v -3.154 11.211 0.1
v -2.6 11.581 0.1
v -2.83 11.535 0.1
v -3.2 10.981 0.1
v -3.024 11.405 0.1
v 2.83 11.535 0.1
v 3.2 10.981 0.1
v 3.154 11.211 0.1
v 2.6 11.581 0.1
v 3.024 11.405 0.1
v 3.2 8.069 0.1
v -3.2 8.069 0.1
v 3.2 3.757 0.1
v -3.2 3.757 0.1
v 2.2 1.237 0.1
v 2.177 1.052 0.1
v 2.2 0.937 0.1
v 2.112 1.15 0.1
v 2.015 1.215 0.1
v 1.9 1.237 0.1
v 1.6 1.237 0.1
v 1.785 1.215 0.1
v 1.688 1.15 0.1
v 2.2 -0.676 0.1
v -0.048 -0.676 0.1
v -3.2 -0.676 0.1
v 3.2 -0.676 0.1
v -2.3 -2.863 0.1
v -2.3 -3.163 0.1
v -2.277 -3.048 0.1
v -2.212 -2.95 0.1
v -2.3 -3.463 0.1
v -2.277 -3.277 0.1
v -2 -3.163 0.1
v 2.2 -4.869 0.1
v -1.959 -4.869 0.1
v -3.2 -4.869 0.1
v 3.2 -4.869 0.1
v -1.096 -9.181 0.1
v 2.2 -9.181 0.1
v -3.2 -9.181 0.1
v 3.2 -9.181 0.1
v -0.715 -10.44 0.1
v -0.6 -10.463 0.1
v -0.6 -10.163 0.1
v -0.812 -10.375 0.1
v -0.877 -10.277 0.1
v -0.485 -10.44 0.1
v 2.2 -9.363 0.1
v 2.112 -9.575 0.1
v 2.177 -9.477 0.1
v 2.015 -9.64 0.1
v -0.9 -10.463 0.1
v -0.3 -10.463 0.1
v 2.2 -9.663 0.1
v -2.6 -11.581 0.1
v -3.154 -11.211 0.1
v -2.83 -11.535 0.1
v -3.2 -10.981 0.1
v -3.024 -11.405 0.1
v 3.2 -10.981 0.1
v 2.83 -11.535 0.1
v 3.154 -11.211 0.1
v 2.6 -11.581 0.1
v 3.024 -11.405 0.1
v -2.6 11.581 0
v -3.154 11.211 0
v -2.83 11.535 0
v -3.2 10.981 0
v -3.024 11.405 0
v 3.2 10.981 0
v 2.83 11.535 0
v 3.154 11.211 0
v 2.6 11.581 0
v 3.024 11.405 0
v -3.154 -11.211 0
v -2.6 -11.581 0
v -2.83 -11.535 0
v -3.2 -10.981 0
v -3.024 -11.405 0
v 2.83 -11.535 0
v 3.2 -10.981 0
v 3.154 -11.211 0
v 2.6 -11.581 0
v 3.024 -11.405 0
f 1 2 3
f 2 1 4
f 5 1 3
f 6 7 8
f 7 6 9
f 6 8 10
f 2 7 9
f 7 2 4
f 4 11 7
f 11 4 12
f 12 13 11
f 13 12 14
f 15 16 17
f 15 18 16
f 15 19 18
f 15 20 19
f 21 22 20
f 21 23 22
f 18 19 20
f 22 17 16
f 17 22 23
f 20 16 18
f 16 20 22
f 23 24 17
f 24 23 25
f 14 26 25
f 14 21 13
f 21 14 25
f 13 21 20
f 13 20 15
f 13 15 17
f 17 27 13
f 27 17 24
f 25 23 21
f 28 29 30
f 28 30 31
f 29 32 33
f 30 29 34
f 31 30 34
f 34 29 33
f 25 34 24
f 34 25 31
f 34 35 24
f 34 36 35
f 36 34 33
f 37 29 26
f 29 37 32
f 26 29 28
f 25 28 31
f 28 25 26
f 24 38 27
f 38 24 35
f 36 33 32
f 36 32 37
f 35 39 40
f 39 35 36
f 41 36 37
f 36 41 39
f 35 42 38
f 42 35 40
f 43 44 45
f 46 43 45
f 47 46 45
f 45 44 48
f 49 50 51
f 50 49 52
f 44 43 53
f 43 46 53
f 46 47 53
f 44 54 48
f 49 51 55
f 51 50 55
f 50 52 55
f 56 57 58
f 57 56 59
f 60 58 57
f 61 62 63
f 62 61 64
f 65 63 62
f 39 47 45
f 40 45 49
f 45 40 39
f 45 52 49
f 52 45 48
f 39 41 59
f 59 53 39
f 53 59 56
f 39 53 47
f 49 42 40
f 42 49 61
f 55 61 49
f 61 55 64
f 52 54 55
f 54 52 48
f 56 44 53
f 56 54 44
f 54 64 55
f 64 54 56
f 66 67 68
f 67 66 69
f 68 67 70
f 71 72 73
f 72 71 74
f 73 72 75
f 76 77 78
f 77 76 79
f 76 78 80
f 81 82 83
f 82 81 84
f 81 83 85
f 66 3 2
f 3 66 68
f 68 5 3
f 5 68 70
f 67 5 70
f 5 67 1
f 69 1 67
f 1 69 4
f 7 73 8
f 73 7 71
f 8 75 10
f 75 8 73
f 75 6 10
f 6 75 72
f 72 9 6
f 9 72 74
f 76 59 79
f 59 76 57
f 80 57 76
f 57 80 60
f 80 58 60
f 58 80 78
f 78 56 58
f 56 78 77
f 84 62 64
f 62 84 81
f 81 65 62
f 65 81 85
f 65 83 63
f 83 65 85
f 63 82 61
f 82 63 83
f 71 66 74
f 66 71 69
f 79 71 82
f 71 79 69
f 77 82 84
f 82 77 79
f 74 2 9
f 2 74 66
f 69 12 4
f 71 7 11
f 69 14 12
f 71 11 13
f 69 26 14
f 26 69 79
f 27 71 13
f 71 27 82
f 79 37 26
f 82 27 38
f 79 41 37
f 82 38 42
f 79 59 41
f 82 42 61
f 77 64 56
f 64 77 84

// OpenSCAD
// file: ../p/1-4cyli.scad
use <../lib.scad>
function ldraw_lib__1_4cyli() = [
// 0 Cylinder 0.25
// 0 Name: 1-4cyli.dat
// 0 Author: James Jessiman
// 0 !LDRAW_ORG Primitive UPDATE 2012-01
// 0 !LICENSE Licensed under CC BY 2.0 and CC BY 4.0 : see CAreadme.txt
// 
// 0 BFC CERTIFY CCW
  [0,"BFC","CERTIFY"],
  [0,"BFC","CCW"],
// 
// 0 !HISTORY 2002-03-23 [sbliss] Added BFC statement.
// 0 !HISTORY 2002-04-25 [PTadmin] Official Update 2002-02
// 0 !HISTORY 2007-06-22 [PTadmin] Header formatted for Contributor Agreement
// 0 !HISTORY 2008-07-01 [PTadmin] Official Update 2008-01
// 0 !HISTORY 2012-02-16 [Philo] Changed to CCW
// 0 !HISTORY 2012-03-30 [PTadmin] Official Update 2012-01
// 
// 
// 4 16 1 1 0 0.9239 1 0.3827 0.9239 0 0.3827 1 0 0
  [4,16,1,1,0,0.9239,1,0.3827,0.9239,0,0.3827,1,0,0],
// 5 24 1 0 0 1 1 0 0.9239 0 0.3827 1 0 -1
  [5,24,1,0,0,1,1,0,0.9239,0,0.3827,1,0,-1],
// 4 16 0.9239 1 0.3827 0.7071 1 0.7071 0.7071 0 0.7071 0.9239 0 0.3827
  [4,16,0.9239,1,0.3827,0.7071,1,0.7071,0.7071,0,0.7071,0.9239,0,0.3827],
// 5 24 0.9239 0 0.3827 0.9239 1 0.3827 0.7071 0 0.7071 1 0 0
  [5,24,0.9239,0,0.3827,0.9239,1,0.3827,0.7071,0,0.7071,1,0,0],
// 4 16 0.7071 1 0.7071 0.3827 1 0.9239 0.3827 0 0.9239 0.7071 0 0.7071
  [4,16,0.7071,1,0.7071,0.3827,1,0.9239,0.3827,0,0.9239,0.7071,0,0.7071],
// 5 24 0.7071 0 0.7071 0.7071 1 0.7071 0.3827 0 0.9239 0.9239 0 0.3827
  [5,24,0.7071,0,0.7071,0.7071,1,0.7071,0.3827,0,0.9239,0.9239,0,0.3827],
// 4 16 0.3827 1 0.9239 0 1 1 0 0 1 0.3827 0 0.9239
  [4,16,0.3827,1,0.9239,0,1,1,0,0,1,0.3827,0,0.9239],
// 5 24 0.3827 0 0.9239 0.3827 1 0.9239 0 0 1 0.7071 0 0.7071
  [5,24,0.3827,0,0.9239,0.3827,1,0.9239,0,0,1,0.7071,0,0.7071],
// 5 24 0 0 1 0 1 1 0.3827 0 0.9239 -1 0 1
  [5,24,0,0,1,0,1,1,0.3827,0,0.9239,-1,0,1],
];
module ldraw_lib__1_4cyli(step=0, col=false, unit=2/5, alt=false, line=0.2, solid=!$preview)
    makepoly(ldraw_lib__1_4cyli(), step=step, col=col, unit=unit, alt=alt, line=line, solid=solid);
ldraw_lib__1_4cyli(line=0.2);
// file: ../p/3-16ndis.scad
use <../lib.scad>
function ldraw_lib__3_16ndis() = [
// 0 Disc Negative 0.1875
// 0 Name: 3-16ndis.dat
// 0 Author: Guy Vivan [guyvivan]
// 0 !LDRAW_ORG Primitive UPDATE 2009-01
// 0 !LICENSE Licensed under CC BY 2.0 and CC BY 4.0 : see CAreadme.txt
// 
// 0 BFC CERTIFY CCW
  [0,"BFC","CERTIFY"],
  [0,"BFC","CCW"],
// 
// 0 !HISTORY 2009-05-02 [PTadmin] Official Update 2009-01
// 
// 
// 3 16 1 0 1 0.9239 0 0.3827 1 0 0
  [3,16,1,0,1,0.9239,0,0.3827,1,0,0],
// 3 16 1 0 1 0.7071 0 0.7071 0.9239 0 0.3827
  [3,16,1,0,1,0.7071,0,0.7071,0.9239,0,0.3827],
// 3 16 1 0 1 0.3827 0 0.9239 0.7071 0 0.7071
  [3,16,1,0,1,0.3827,0,0.9239,0.7071,0,0.7071],
// 
// 0 end of file
// 
];
module ldraw_lib__3_16ndis(step=0, col=false, unit=2/5, alt=false, line=0.2, solid=!$preview)
    makepoly(ldraw_lib__3_16ndis(), step=step, col=col, unit=unit, alt=alt, line=line, solid=solid);
ldraw_lib__3_16ndis(line=0.2);
// file: ../p/3-16disc.scad
use <../lib.scad>
function ldraw_lib__3_16disc() = [
// 0 Disc 0.1875
// 0 Name: 3-16disc.dat
// 0 Author: Guy Vivan [guyvivan]
// 0 !LDRAW_ORG Primitive UPDATE 2009-01
// 0 !LICENSE Licensed under CC BY 2.0 and CC BY 4.0 : see CAreadme.txt
// 
// 0 BFC CERTIFY CCW
  [0,"BFC","CERTIFY"],
  [0,"BFC","CCW"],
// 
// 0 !HISTORY 2009-05-02 [PTadmin] Official Update 2009-01
// 
// 
// 3 16 0 0 0 1 0 0 0.9239 0 0.3827
  [3,16,0,0,0,1,0,0,0.9239,0,0.3827],
// 3 16 0 0 0 0.9239 0 0.3827 0.7071 0 0.7071
  [3,16,0,0,0,0.9239,0,0.3827,0.7071,0,0.7071],
// 3 16 0 0 0 0.7071 0 0.7071 0.3827 0 0.9239
  [3,16,0,0,0,0.7071,0,0.7071,0.3827,0,0.9239],
// 
// 0 end of file
// 
];
module ldraw_lib__3_16disc(step=0, col=false, unit=2/5, alt=false, line=0.2, solid=!$preview)
    makepoly(ldraw_lib__3_16disc(), step=step, col=col, unit=unit, alt=alt, line=line, solid=solid);
ldraw_lib__3_16disc(line=0.2);
// file: ../p/3-16chrd.scad
use <../lib.scad>
function ldraw_lib__3_16chrd() = [
// 0 Chord 0.1875
// 0 Name: 3-16chrd.dat
// 0 Author: Niels Karsdorp [nielsk]
// 0 !LDRAW_ORG Primitive UPDATE 2009-01
// 0 !LICENSE Licensed under CC BY 2.0 and CC BY 4.0 : see CAreadme.txt
// 
// 0 BFC CERTIFY CCW
  [0,"BFC","CERTIFY"],
  [0,"BFC","CCW"],
// 
// 0 !HISTORY 2009-05-02 [PTadmin] Official Update 2009-01
// 
// 
// 4 16 1 0 0 0.9239 0 0.3827 0.7071 0 0.7071 0.3827 0 0.9239
  [4,16,1,0,0,0.9239,0,0.3827,0.7071,0,0.7071,0.3827,0,0.9239],
// 0
// 
];
module ldraw_lib__3_16chrd(step=0, col=false, unit=2/5, alt=false, line=0.2, solid=!$preview)
    makepoly(ldraw_lib__3_16chrd(), step=step, col=col, unit=unit, alt=alt, line=line, solid=solid);
ldraw_lib__3_16chrd(line=0.2);
// file: ../p/1-8ndis.scad
use <../lib.scad>
function ldraw_lib__1_8ndis() = [
// 0 Disc Negative 0.125
// 0 Name: 1-8ndis.dat
// 0 Author: James Jessiman
// 0 !LDRAW_ORG Primitive UPDATE 2012-01
// 0 !LICENSE Licensed under CC BY 2.0 and CC BY 4.0 : see CAreadme.txt
// 
// 0 BFC CERTIFY CCW
  [0,"BFC","CERTIFY"],
  [0,"BFC","CCW"],
// 
// 0 !HISTORY 2002-03-23 [sbliss] Added BFC statement
// 0 !HISTORY 2002-04-25 [PTadmin] Official Update 2002-02
// 0 !HISTORY 2007-06-22 [PTadmin] Header formatted for Contributor Agreement
// 0 !HISTORY 2008-07-01 [PTadmin] Official Update 2008-01
// 0 !HISTORY 2012-02-16 [Philo] Changed to CCW
// 0 !HISTORY 2012-03-30 [PTadmin] Official Update 2012-01
// 
// 
// 3 16 0.9239 0 0.3827 1 0 0 1 0 1
  [3,16,0.9239,0,0.3827,1,0,0,1,0,1],
// 3 16 0.7071 0 0.7071 0.9239 0 0.3827 1 0 1
  [3,16,0.7071,0,0.7071,0.9239,0,0.3827,1,0,1],
];
module ldraw_lib__1_8ndis(step=0, col=false, unit=2/5, alt=false, line=0.2, solid=!$preview)
    makepoly(ldraw_lib__1_8ndis(), step=step, col=col, unit=unit, alt=alt, line=line, solid=solid);
ldraw_lib__1_8ndis(line=0.2);
// file: ../p/1-8disc.scad
use <../lib.scad>
function ldraw_lib__1_8disc() = [
// 0 Disc 0.125
// 0 Name: 1-8disc.dat
// 0 Author: James Jessiman
// 0 !LDRAW_ORG Primitive UPDATE 2002-02
// 0 !LICENSE Licensed under CC BY 2.0 and CC BY 4.0 : see CAreadme.txt
// 
// 0 BFC CERTIFY CCW
  [0,"BFC","CERTIFY"],
  [0,"BFC","CCW"],
// 
// 0 !HISTORY 1998-12-15 [PTadmin] Official Update 1998-10
// 0 !HISTORY 2002-03-23 [sbliss] Added BFC statement; merged headers from files in LDraw 0.27 and Complete.exe distributions.
// 0 !HISTORY 2002-04-25 [PTadmin] Official Update 2002-02
// 0 !HISTORY 2007-06-22 [PTadmin] Header formatted for Contributor Agreement
// 0 !HISTORY 2008-07-01 [PTadmin] Official Update 2008-01
// 
// 
// 3 16 0 0 0 1 0 0 0.9239 0 0.3827
  [3,16,0,0,0,1,0,0,0.9239,0,0.3827],
// 3 16 0 0 0 0.9239 0 0.3827 0.7071 0 0.7071
  [3,16,0,0,0,0.9239,0,0.3827,0.7071,0,0.7071],
// 0
];
module ldraw_lib__1_8disc(step=0, col=false, unit=2/5, alt=false, line=0.2, solid=!$preview)
    makepoly(ldraw_lib__1_8disc(), step=step, col=col, unit=unit, alt=alt, line=line, solid=solid);
ldraw_lib__1_8disc(line=0.2);
// file: ../p/1-16ndis.scad
use <../lib.scad>
function ldraw_lib__1_16ndis() = [
// 0 Disc Negative 0.0625
// 0 Name: 1-16ndis.dat
// 0 Author: Niels Karsdorp [nielsk]
// 0 !LDRAW_ORG Primitive UPDATE 2009-01
// 0 !LICENSE Licensed under CC BY 2.0 and CC BY 4.0 : see CAreadme.txt
// 
// 0 BFC CERTIFY CCW
  [0,"BFC","CERTIFY"],
  [0,"BFC","CCW"],
// 
// 0 !HISTORY 2009-05-02 [PTadmin] Official Update 2009-01
// 
// 
// 3 16 1 0 0 1 0 1 0.9239 0 0.3827
  [3,16,1,0,0,1,0,1,0.9239,0,0.3827],
// 0
];
module ldraw_lib__1_16ndis(step=0, col=false, unit=2/5, alt=false, line=0.2, solid=!$preview)
    makepoly(ldraw_lib__1_16ndis(), step=step, col=col, unit=unit, alt=alt, line=line, solid=solid);
ldraw_lib__1_16ndis(line=0.2);
// file: ../p/1-16disc.scad
use <../lib.scad>
function ldraw_lib__1_16disc() = [
// 0 Disc 0.0625
// 0 Name: 1-16disc.dat
// 0 Author: Guy Vivan [guyvivan]
// 0 !LDRAW_ORG Primitive UPDATE 2009-01
// 0 !LICENSE Licensed under CC BY 2.0 and CC BY 4.0 : see CAreadme.txt
// 
// 0 BFC CERTIFY CCW
  [0,"BFC","CERTIFY"],
  [0,"BFC","CCW"],
// 
// 0 !HISTORY 2009-05-02 [PTadmin] Official Update 2009-01
// 
// 
// 3 16 0 0 0 1 0 0 0.9239 0 0.3827
  [3,16,0,0,0,1,0,0,0.9239,0,0.3827],
// 
// 0 end of file
// 
];
module ldraw_lib__1_16disc(step=0, col=false, unit=2/5, alt=false, line=0.2, solid=!$preview)
    makepoly(ldraw_lib__1_16disc(), step=step, col=col, unit=unit, alt=alt, line=line, solid=solid);
ldraw_lib__1_16disc(line=0.2);
// file: ../p/3-8ndis.scad
use <../lib.scad>
function ldraw_lib__3_8ndis() = [
// 0 Disc Negative 0.375
// 0 Name: 3-8ndis.dat
// 0 Author: Alex Taylor [anathema]
// 0 !LDRAW_ORG Primitive UPDATE 2009-02
// 0 !LICENSE Licensed under CC BY 2.0 and CC BY 4.0 : see CAreadme.txt
// 
// 0 BFC CERTIFY CCW
  [0,"BFC","CERTIFY"],
  [0,"BFC","CCW"],
// 
// 0 !HISTORY 2009-09-03 [PTadmin] Official Update 2009-02
// 
// 
// 3 16 1 0 1 0.9239 0 0.3827 1 0 0
  [3,16,1,0,1,0.9239,0,0.3827,1,0,0],
// 3 16 1 0 1 0.7071 0 0.7071 0.9239 0 0.3827
  [3,16,1,0,1,0.7071,0,0.7071,0.9239,0,0.3827],
// 3 16 1 0 1 0.3827 0 0.9239 0.7071 0 0.7071
  [3,16,1,0,1,0.3827,0,0.9239,0.7071,0,0.7071],
// 3 16 1 0 1 0 0 1 0.3827 0 0.9239
  [3,16,1,0,1,0,0,1,0.3827,0,0.9239],
// 3 16 -1 0 1 -0.3827 0 0.9239 0 0 1
  [3,16,-1,0,1,-0.3827,0,0.9239,0,0,1],
// 3 16 -1 0 1 -0.7071 0 0.7071 -0.3827 0 0.9239
  [3,16,-1,0,1,-0.7071,0,0.7071,-0.3827,0,0.9239],
// 0
];
module ldraw_lib__3_8ndis(step=0, col=false, unit=2/5, alt=false, line=0.2, solid=!$preview)
    makepoly(ldraw_lib__3_8ndis(), step=step, col=col, unit=unit, alt=alt, line=line, solid=solid);
ldraw_lib__3_8ndis(line=0.2);
// file: ../p/3-8chrd.scad
use <../lib.scad>
function ldraw_lib__3_8chrd() = [
// 0 Chord 0.375
// 0 Name: 3-8chrd.dat
// 0 Author: Donald Sutter [technog]
// 0 !LDRAW_ORG Primitive UPDATE 2005-01
// 0 !LICENSE Licensed under CC BY 2.0 and CC BY 4.0 : see CAreadme.txt
// 
// 0 BFC CERTIFY CCW
  [0,"BFC","CERTIFY"],
  [0,"BFC","CCW"],
// 
// 0 !HISTORY 2004-01-07 [Steffen] added primitive code for POVray
// 0 !HISTORY 2004-03-18 [mkennedy] removed pov code and rearanged polygons.
// 0 !HISTORY 2004-09-12 [cwdee] reversed winding and standardised precision
// 0 !HISTORY 2005-12-28 [PTadmin] Official Update 2005-01
// 0 !HISTORY 2007-06-24 [PTadmin] Header formatted for Contributor Agreement
// 0 !HISTORY 2008-07-01 [PTadmin] Official Update 2008-01
// 
// 
// 3 16 0.7071 0 0.7071 0.3827 0 0.9239 0 0 1
  [3,16,0.7071,0,0.7071,0.3827,0,0.9239,0,0,1],
// 4 16 0.9239 0 0.3827 -0.3827 0 0.9239 -0.7071 0 0.7071 1 0 0
  [4,16,0.9239,0,0.3827,-0.3827,0,0.9239,-0.7071,0,0.7071,1,0,0],
// 4 16 0.7071 0 0.7071 0 0 1 -0.3827 0 0.9239 0.9239 0 0.3827
  [4,16,0.7071,0,0.7071,0,0,1,-0.3827,0,0.9239,0.9239,0,0.3827],
// 0
];
module ldraw_lib__3_8chrd(step=0, col=false, unit=2/5, alt=false, line=0.2, solid=!$preview)
    makepoly(ldraw_lib__3_8chrd(), step=step, col=col, unit=unit, alt=alt, line=line, solid=solid);
ldraw_lib__3_8chrd(line=0.2);
// file: ../p/1-4chrd.scad
use <../lib.scad>
function ldraw_lib__1_4chrd() = [
// 0 Chord 0.25
// 0 Name: 1-4chrd.dat
// 0 Author: Tony Hafner [hafhead]
// 0 !LDRAW_ORG Primitive UPDATE 2012-02
// 0 !LICENSE Licensed under CC BY 2.0 and CC BY 4.0 : see CAreadme.txt
// 
// 0 BFC CERTIFY CCW
  [0,"BFC","CERTIFY"],
  [0,"BFC","CCW"],
// 
// 0 !HISTORY 2004-04-22 [PTadmin] Official Update 2004-02
// 0 !HISTORY 2007-10-09 [PTadmin] Header formatted for Contributor Agreement
// 0 !HISTORY 2008-07-01 [PTadmin] Official Update 2008-01
// 0 !HISTORY 2012-08-02 [MMR1988] Re-creation with PrimGen2 and Rectifier
// 0 !HISTORY 2012-08-09 [PTadmin] Official Update 2012-02
// 
// 
// 4 16 0.9239 0 0.3827 0.3827 0 0.9239 0 0 1 1 0 0
  [4,16,0.9239,0,0.3827,0.3827,0,0.9239,0,0,1,1,0,0],
// 3 16 0.7071 0 0.7071 0.3827 0 0.9239 0.9239 0 0.3827
  [3,16,0.7071,0,0.7071,0.3827,0,0.9239,0.9239,0,0.3827],
];
module ldraw_lib__1_4chrd(step=0, col=false, unit=2/5, alt=false, line=0.2, solid=!$preview)
    makepoly(ldraw_lib__1_4chrd(), step=step, col=col, unit=unit, alt=alt, line=line, solid=solid);
ldraw_lib__1_4chrd(line=0.2);
// file: s/6142622vs06.scad
use <../../lib.scad>
use <../../p/1-4chrd.scad>
use <../../p/1-4cyli.scad>
function ldraw_lib__s__6142622vs06() = [
// 0 ~Sticker  2.9 x  0.8 with Black Trapezoid on Yellow Background Left - Bottom Face
// 0 Name: s\6142622vs06.dat
// 0 Author: Massimo Maso [Sirio]
// 0 !LDRAW_ORG Subpart UPDATE 2022-03
// 0 !LICENSE Licensed under CC BY 2.0 and CC BY 4.0 : see CAreadme.txt
// 
// 0 BFC CERTIFY CCW
  [0,"BFC","CERTIFY"],
  [0,"BFC","CCW"],
// 
// 0 !HISTORY 2022-05-07 [PTadmin] Official Update 2022-03
// 
// 
// 0 // Primitives
// 1 16 -6.5 0 77.359 0 0 -1.5 0 -1 0 1.5 0 0 1-4chrd.dat
  [1,16,-6.5,0,77.359,0,0,-1.5,0,-1,0,1.5,0,0, ldraw_lib__1_4chrd()],
// 1 16 6.5 0 77.359 1.5 0 0 0 -1 0 0 0 1.5 1-4chrd.dat
  [1,16,6.5,0,77.359,1.5,0,0,0,-1,0,0,0,1.5, ldraw_lib__1_4chrd()],
// 1 16 -6.5 0 22.4535 -1.5 0 0 0 -1 0 0 0 -1.5 1-4chrd.dat
  [1,16,-6.5,0,22.4535,-1.5,0,0,0,-1,0,0,0,-1.5, ldraw_lib__1_4chrd()],
// 1 16 6.5 0 22.4535 0 0 1.5 0 -1 0 -1.5 0 0 1-4chrd.dat
  [1,16,6.5,0,22.4535,0,0,1.5,0,-1,0,-1.5,0,0, ldraw_lib__1_4chrd()],
// 1 16 -6.5 0 77.359 0 0 -1.5 0 -.25 0 1.5 0 0 1-4cyli.dat
  [1,16,-6.5,0,77.359,0,0,-1.5,0,-.25,0,1.5,0,0, ldraw_lib__1_4cyli()],
// 1 16 6.5 0 77.359 1.5 0 0 0 -.25 0 0 0 1.5 1-4cyli.dat
  [1,16,6.5,0,77.359,1.5,0,0,0,-.25,0,0,0,1.5, ldraw_lib__1_4cyli()],
// 1 16 -6.5 0 22.4535 -1.5 0 0 0 -.25 0 0 0 -1.5 1-4cyli.dat
  [1,16,-6.5,0,22.4535,-1.5,0,0,0,-.25,0,0,0,-1.5, ldraw_lib__1_4cyli()],
// 1 16 6.5 0 22.4535 0 0 1.5 0 -.25 0 -1.5 0 0 1-4cyli.dat
  [1,16,6.5,0,22.4535,0,0,1.5,0,-.25,0,-1.5,0,0, ldraw_lib__1_4cyli()],
// 0 // Bottom face
// 4 16 -6.5 0 78.859 6.5 0 78.859 8 0 77.359 -8 0 77.359
  [4,16,-6.5,0,78.859,6.5,0,78.859,8,0,77.359,-8,0,77.359],
// 4 16 -8 0 77.359 8 0 77.359 8 0 22.4535 -8 0 22.4535
  [4,16,-8,0,77.359,8,0,77.359,8,0,22.4535,-8,0,22.4535],
// 4 16 -8 0 22.4535 8 0 22.4535 6.5 0 20.9535 -6.5 0 20.9535
  [4,16,-8,0,22.4535,8,0,22.4535,6.5,0,20.9535,-6.5,0,20.9535],
// 0 // Lateral faces
// 4 16 -6.5 0 78.859 -6.5 -.25 78.859 6.5 -.25 78.859 6.5 0 78.859
  [4,16,-6.5,0,78.859,-6.5,-.25,78.859,6.5,-.25,78.859,6.5,0,78.859],
// 3 16 -8 0 77.359 -8 -.25 70.0796 -8 -.25 77.359
  [3,16,-8,0,77.359,-8,-.25,70.0796,-8,-.25,77.359],
// 3 16 8 0 77.359 8 -.25 77.359 8 -.25 70.0796
  [3,16,8,0,77.359,8,-.25,77.359,8,-.25,70.0796],
// 3 16 -8 0 77.359 -8 -.25 59.2983 -8 -.25 70.0796
  [3,16,-8,0,77.359,-8,-.25,59.2983,-8,-.25,70.0796],
// 3 16 8 0 77.359 8 -.25 70.0796 8 -.25 59.2983
  [3,16,8,0,77.359,8,-.25,70.0796,8,-.25,59.2983],
// 4 16 -8 0 77.359 -8 0 22.4535 -8 -.25 48.2168 -8 -.25 59.2983
  [4,16,-8,0,77.359,-8,0,22.4535,-8,-.25,48.2168,-8,-.25,59.2983],
// 4 16 8 0 77.359 8 -.25 59.2983 8 -.25 48.2168 8 0 22.4535
  [4,16,8,0,77.359,8,-.25,59.2983,8,-.25,48.2168,8,0,22.4535],
// 3 16 -8 0 22.4535 -8 -.25 37.7348 -8 -.25 48.2168
  [3,16,-8,0,22.4535,-8,-.25,37.7348,-8,-.25,48.2168],
// 3 16 8 0 22.4535 8 -.25 48.2168 8 -.25 37.7348
  [3,16,8,0,22.4535,8,-.25,48.2168,8,-.25,37.7348],
// 3 16 -8 0 22.4535 -8 -.25 26.9535 -8 -.25 37.7348
  [3,16,-8,0,22.4535,-8,-.25,26.9535,-8,-.25,37.7348],
// 3 16 8 0 22.4535 8 -.25 37.7348 8 -.25 26.9535
  [3,16,8,0,22.4535,8,-.25,37.7348,8,-.25,26.9535],
// 3 16 -8 0 22.4535 -8 -.25 22.4535 -8 -.25 26.9535
  [3,16,-8,0,22.4535,-8,-.25,22.4535,-8,-.25,26.9535],
// 3 16 8 0 22.4535 8 -.25 26.9535 8 -.25 22.4535
  [3,16,8,0,22.4535,8,-.25,26.9535,8,-.25,22.4535],
// 4 16 -6.5 0 20.9535 6.5 0 20.9535 6.5 -.25 20.9535 -6.5 -.25 20.9535
  [4,16,-6.5,0,20.9535,6.5,0,20.9535,6.5,-.25,20.9535,-6.5,-.25,20.9535],
];
module ldraw_lib__s__6142622vs06(step=0, col=false, unit=2/5, alt=false, line=0.2, solid=!$preview)
    makepoly(ldraw_lib__s__6142622vs06(), step=step, col=col, unit=unit, alt=alt, line=line, solid=solid);
ldraw_lib__s__6142622vs06(line=0.2);
// file: s/6142622vs05.scad
use <../../lib.scad>
use <../../p/1-16disc.scad>
use <../../p/1-16ndis.scad>
use <../../p/1-4chrd.scad>
use <../../p/3-16chrd.scad>
use <../../p/3-16disc.scad>
use <../../p/3-16ndis.scad>
function ldraw_lib__s__6142622vs05() = [
// 0 ~Sticker  2.9 x  0.8 with Black Trapezoid on Yellow Background Left - Sixth Face
// 0 Name: s\6142622vs05.dat
// 0 Author: Massimo Maso [Sirio]
// 0 !LDRAW_ORG Subpart UPDATE 2022-03
// 0 !LICENSE Licensed under CC BY 2.0 and CC BY 4.0 : see CAreadme.txt
// 
// 0 BFC CERTIFY CCW
  [0,"BFC","CERTIFY"],
  [0,"BFC","CCW"],
// 
// 0 !HISTORY 2022-05-07 [PTadmin] Official Update 2022-03
// 
// 
// 0 // Primitives
// 1 0 -1.5 -.25 -2.4514 0 0 -.75 0 1 0 -.75 0 0 3-16disc.dat
  [1,0,-1.5,-.25,-2.4514,0,0,-.75,0,1,0,-.75,0,0, ldraw_lib__3_16disc()],
// 1 0 -1.5 -.25 -2.4514 0 0 .75 0 1 0 -.75 0 0 1-16disc.dat
  [1,0,-1.5,-.25,-2.4514,0,0,.75,0,1,0,-.75,0,0, ldraw_lib__1_16disc()],
// 1 0 4.75 -.25 -.4514 .75 0 0 0 1 0 0 0 -.75 3-16chrd.dat
  [1,0,4.75,-.25,-.4514,.75,0,0,0,1,0,0,0,-.75, ldraw_lib__3_16chrd()],
// 1 14 -1.5 -.25 -2.4514 0 0 -.75 0 1 0 -.75 0 0 3-16ndis.dat
  [1,14,-1.5,-.25,-2.4514,0,0,-.75,0,1,0,-.75,0,0, ldraw_lib__3_16ndis()],
// 1 14 -1.5 -.25 -2.4514 0 0 .75 0 1 0 -.75 0 0 1-16ndis.dat
  [1,14,-1.5,-.25,-2.4514,0,0,.75,0,1,0,-.75,0,0, ldraw_lib__1_16ndis()],
// 1 14 4.75 -.25 -.4514 .75 0 0 0 1 0 0 0 -.75 3-16ndis.dat
  [1,14,4.75,-.25,-.4514,.75,0,0,0,1,0,0,0,-.75, ldraw_lib__3_16ndis()],
// 1 14 -6.5 -.25 -4.4979 -1.5 0 0 0 1 0 0 0 -1.5 1-4chrd.dat
  [1,14,-6.5,-.25,-4.4979,-1.5,0,0,0,1,0,0,0,-1.5, ldraw_lib__1_4chrd()],
// 1 14 6.5 -.25 -4.4979 0 0 1.5 0 1 0 -1.5 0 0 1-4chrd.dat
  [1,14,6.5,-.25,-4.4979,0,0,1.5,0,1,0,-1.5,0,0, ldraw_lib__1_4chrd()],
// 0 // Black faces
// 3 0 -2.741 -.25 .0021 -2.192925 -.25 -2.738425 -1.5 -.25 -2.4514
  [3,0,-2.741,-.25,.0021,-2.192925,-.25,-2.738425,-1.5,-.25,-2.4514],
// 4 0 -2.741 -.25 .0021 -1.5 -.25 -2.4514 5.5 -.25 -.4514 5.5 -.25 .0021
  [4,0,-2.741,-.25,.0021,-1.5,-.25,-2.4514,5.5,-.25,-.4514,5.5,-.25,.0021],
// 4 0 5.5 -.25 -.4514 -1.5 -.25 -2.4514 -1.212975 -.25 -3.144325 5.037025 -.25 -1.144325
  [4,0,5.5,-.25,-.4514,-1.5,-.25,-2.4514,-1.212975,-.25,-3.144325,5.037025,-.25,-1.144325],
// 0 // Yellow faces
// 3 14 -2.741 -.25 .0021 -8 -.25 .0021 -8 -.25 -4.4979
  [3,14,-2.741,-.25,.0021,-8,-.25,.0021,-8,-.25,-4.4979],
// 4 14 -2.741 -.25 .0021 -8 -.25 -4.4979 -6.5 -.25 -5.9979 -2.25 -.25 -3.2014
  [4,14,-2.741,-.25,.0021,-8,-.25,-4.4979,-6.5,-.25,-5.9979,-2.25,-.25,-3.2014],
// 3 14 -2.741 -.25 .0021 -2.25 -.25 -3.2014 -2.192925 -.25 -2.738425
  [3,14,-2.741,-.25,.0021,-2.25,-.25,-3.2014,-2.192925,-.25,-2.738425],
// 4 14 8 -.25 -4.4979 8 -.25 .0021 5.5 -.25 .0021 5.5 -.25 -.4514
  [4,14,8,-.25,-4.4979,8,-.25,.0021,5.5,-.25,.0021,5.5,-.25,-.4514],
// 4 14 8 -.25 -4.4979 5.5 -.25 -.4514 5.5 -.25 -1.2014 6.5 -.25 -5.9979
  [4,14,8,-.25,-4.4979,5.5,-.25,-.4514,5.5,-.25,-1.2014,6.5,-.25,-5.9979],
// 4 14 -1.212975 -.25 -3.144325 -.75 -.25 -3.2014 5.5 -.25 -1.2014 5.037025 -.25 -1.144325
  [4,14,-1.212975,-.25,-3.144325,-.75,-.25,-3.2014,5.5,-.25,-1.2014,5.037025,-.25,-1.144325],
// 3 14 -6.5 -.25 -5.9979 -1.5 -.25 -3.2014 -2.25 -.25 -3.2014
  [3,14,-6.5,-.25,-5.9979,-1.5,-.25,-3.2014,-2.25,-.25,-3.2014],
// 3 14 -6.5 -.25 -5.9979 -.75 -.25 -3.2014 -1.5 -.25 -3.2014
  [3,14,-6.5,-.25,-5.9979,-.75,-.25,-3.2014,-1.5,-.25,-3.2014],
// 4 14 -6.5 -.25 -5.9979 6.5 -.25 -5.9979 5.5 -.25 -1.2014 -.75 -.25 -3.2014
  [4,14,-6.5,-.25,-5.9979,6.5,-.25,-5.9979,5.5,-.25,-1.2014,-.75,-.25,-3.2014],
];
module ldraw_lib__s__6142622vs05(step=0, col=false, unit=2/5, alt=false, line=0.2, solid=!$preview)
    makepoly(ldraw_lib__s__6142622vs05(), step=step, col=col, unit=unit, alt=alt, line=line, solid=solid);
ldraw_lib__s__6142622vs05(line=0.2);
// file: s/6142622vs04.scad
use <../../lib.scad>
function ldraw_lib__s__6142622vs04() = [
// 0 ~Sticker  2.9 x  0.8 with Black Trapezoid on Yellow Background Left - Fifth Face
// 0 Name: s\6142622vs04.dat
// 0 Author: Massimo Maso [Sirio]
// 0 !LDRAW_ORG Subpart UPDATE 2022-03
// 0 !LICENSE Licensed under CC BY 2.0 and CC BY 4.0 : see CAreadme.txt
// 
// 0 BFC CERTIFY CCW
  [0,"BFC","CERTIFY"],
  [0,"BFC","CCW"],
// 
// 0 !HISTORY 2022-05-07 [PTadmin] Official Update 2022-03
// 
// 
// 0 // Black face
// 4 0 -4.8973 -.25 10.7792 -2.741 -.25 -.0021 5.5 -.25 -.0021 5.5 -.25 10.7792
  [4,0,-4.8973,-.25,10.7792,-2.741,-.25,-.0021,5.5,-.25,-.0021,5.5,-.25,10.7792],
// 0 // Yellow faces
// 4 14 -8 -.25 10.7792 -8 -.25 -.0021 -2.741 -.25 -.0021 -4.8973 -.25 10.7792
  [4,14,-8,-.25,10.7792,-8,-.25,-.0021,-2.741,-.25,-.0021,-4.8973,-.25,10.7792],
// 4 14 8 -.25 10.7792 5.5 -.25 10.7792 5.5 -.25 -.0021 8 -.25 -.0021
  [4,14,8,-.25,10.7792,5.5,-.25,10.7792,5.5,-.25,-.0021,8,-.25,-.0021],
];
module ldraw_lib__s__6142622vs04(step=0, col=false, unit=2/5, alt=false, line=0.2, solid=!$preview)
    makepoly(ldraw_lib__s__6142622vs04(), step=step, col=col, unit=unit, alt=alt, line=line, solid=solid);
ldraw_lib__s__6142622vs04(line=0.2);
// file: s/6142622vs03.scad
use <../../lib.scad>
use <../../p/1-16disc.scad>
use <../../p/1-16ndis.scad>
use <../../p/1-8disc.scad>
use <../../p/1-8ndis.scad>
function ldraw_lib__s__6142622vs03() = [
// 0 ~Sticker  2.9 x  0.8 with Black Trapezoid on Yellow Background Left - Fourth Face
// 0 Name: s\6142622vs03.dat
// 0 Author: Massimo Maso [Sirio]
// 0 !LDRAW_ORG Subpart UPDATE 2022-03
// 0 !LICENSE Licensed under CC BY 2.0 and CC BY 4.0 : see CAreadme.txt
// 
// 0 BFC CERTIFY CCW
  [0,"BFC","CERTIFY"],
  [0,"BFC","CCW"],
// 
// 0 !HISTORY 2022-05-07 [PTadmin] Official Update 2022-03
// 
// 
// 0 // Primitives
// 1 14 -5 -.25 -6.2144 -.75 0 0 0 1 0 0 0 .75 1-8ndis.dat
  [1,14,-5,-.25,-6.2144,-.75,0,0,0,1,0,0,0,.75, ldraw_lib__1_8ndis()],
// 1 14 -5 -.25 -6.2144 -.75 0 0 0 1 0 0 0 -.75 1-16ndis.dat
  [1,14,-5,-.25,-6.2144,-.75,0,0,0,1,0,0,0,-.75, ldraw_lib__1_16ndis()],
// 1 0 -5 -.25 -6.2144 -.75 0 0 0 1 0 0 0 .75 1-8disc.dat
  [1,0,-5,-.25,-6.2144,-.75,0,0,0,1,0,0,0,.75, ldraw_lib__1_8disc()],
// 1 0 -5 -.25 -6.2144 -.75 0 0 0 1 0 0 0 -.75 1-16disc.dat
  [1,0,-5,-.25,-6.2144,-.75,0,0,0,1,0,0,0,-.75, ldraw_lib__1_16disc()],
// 0 // Black faces
// 4 0 -5 -.25 -6.2144 5.5 -.25 .0024 -.121239 -.25 .0024 -5.530325 -.25 -5.68408
  [4,0,-5,-.25,-6.2144,5.5,-.25,.0024,-.121239,-.25,.0024,-5.530325,-.25,-5.68408],
// 3 0 -5 -.25 -6.2144 5.5 -.25 -10.4796 5.5 -.25 .0024
  [3,0,-5,-.25,-6.2144,5.5,-.25,-10.4796,5.5,-.25,.0024],
// 4 0 -5 -.25 -6.2144 -5.692925 -.25 -6.50142 -4.8973 -.25 -10.4796 5.5 -.25 -10.4796
  [4,0,-5,-.25,-6.2144,-5.692925,-.25,-6.50142,-4.8973,-.25,-10.4796,5.5,-.25,-10.4796],
// 0 // Yellow faces
// 4 14 -8 -.25 .0024 -8 -.25 -10.4796 -5.75 -.25 -6.9644 -5.75 -.25 -6.2144
  [4,14,-8,-.25,.0024,-8,-.25,-10.4796,-5.75,-.25,-6.9644,-5.75,-.25,-6.2144],
// 3 14 -8 -.25 .0024 -5.75 -.25 -6.2144 -5.75 -.25 -5.4644
  [3,14,-8,-.25,.0024,-5.75,-.25,-6.2144,-5.75,-.25,-5.4644],
// 4 14 -8 -.25 .0024 -5.75 -.25 -5.4644 -5.530325 -.25 -5.684075 -.121239 -.25 .0024
  [4,14,-8,-.25,.0024,-5.75,-.25,-5.4644,-5.530325,-.25,-5.684075,-.121239,-.25,.0024],
// 4 14 8 -.25 .0024 5.5 -.25 .0024 5.5 -.25 -10.4796 8 -.25 -10.4796
  [4,14,8,-.25,.0024,5.5,-.25,.0024,5.5,-.25,-10.4796,8,-.25,-10.4796],
// 3 14 -4.8973 -.25 -10.4796 -5.692925 -.25 -6.501425 -5.75 -.25 -6.9644
  [3,14,-4.8973,-.25,-10.4796,-5.692925,-.25,-6.501425,-5.75,-.25,-6.9644],
// 3 14 -4.8973 -.25 -10.4796 -5.75 -.25 -6.9644 -8 -.25 -10.4796
  [3,14,-4.8973,-.25,-10.4796,-5.75,-.25,-6.9644,-8,-.25,-10.4796],
];
module ldraw_lib__s__6142622vs03(step=0, col=false, unit=2/5, alt=false, line=0.2, solid=!$preview)
    makepoly(ldraw_lib__s__6142622vs03(), step=step, col=col, unit=unit, alt=alt, line=line, solid=solid);
ldraw_lib__s__6142622vs03(line=0.2);
// file: s/6142622vs02.scad
use <../../lib.scad>
use <../../p/3-8chrd.scad>
use <../../p/3-8ndis.scad>
function ldraw_lib__s__6142622vs02() = [
// 0 ~Sticker  2.9 x  0.8 with Black Trapezoid on Yellow Background Left - Third Face
// 0 Name: s\6142622vs02.dat
// 0 Author: Massimo Maso [Sirio]
// 0 !LDRAW_ORG Subpart UPDATE 2022-03
// 0 !LICENSE Licensed under CC BY 2.0 and CC BY 4.0 : see CAreadme.txt
// 
// 0 BFC CERTIFY CCW
  [0,"BFC","CERTIFY"],
  [0,"BFC","CCW"],
// 
// 0 !HISTORY 2022-05-07 [PTadmin] Official Update 2022-03
// 
// 
// 0 // Primitives
// 1 14 4.75 -.25 4.0308 .75 0 0 0 1 0 0 0 .75 3-8ndis.dat
  [1,14,4.75,-.25,4.0308,.75,0,0,0,1,0,0,0,.75, ldraw_lib__3_8ndis()],
// 1 0 4.75 -.25 4.0308 .75 0 0 0 1 0 0 0 .75 3-8chrd.dat
  [1,0,4.75,-.25,4.0308,.75,0,0,0,1,0,0,0,.75, ldraw_lib__3_8chrd()],
// 0 // Black face
// 4 0 5.5 -.25 -.0024 5.5 -.25 4.0308 4.219675 -.25 4.561125 -.121239 -.25 -.0024
  [4,0,5.5,-.25,-.0024,5.5,-.25,4.0308,4.219675,-.25,4.561125,-.121239,-.25,-.0024],
// 0 // Yellow face
// 3 14 -8 -.25 11.0791 -8 -.25 -.0024 -.121239 -.25 -.0024
  [3,14,-8,-.25,11.0791,-8,-.25,-.0024,-.121239,-.25,-.0024],
// 4 14 -8 -.25 11.0791 -.121239 -.25 -.0024 4 -.25 4.7808 8 -.25 11.0791
  [4,14,-8,-.25,11.0791,-.121239,-.25,-.0024,4,-.25,4.7808,8,-.25,11.0791],
// 3 14 8 -.25 11.0791 4 -.25 4.7808 4.75 -.25 4.7808
  [3,14,8,-.25,11.0791,4,-.25,4.7808,4.75,-.25,4.7808],
// 3 14 8 -.25 11.0791 4.75 -.25 4.7808 5.5 -.25 4.7808
  [3,14,8,-.25,11.0791,4.75,-.25,4.7808,5.5,-.25,4.7808],
// 3 14 8 -.25 11.0791 5.5 -.25 4.7808 5.5 -.25 4.0308
  [3,14,8,-.25,11.0791,5.5,-.25,4.7808,5.5,-.25,4.0308],
// 4 14 8 -.25 11.0791 5.5 -.25 4.0308 5.5 -.25 -.0024 8 -.25 -.0024
  [4,14,8,-.25,11.0791,5.5,-.25,4.0308,5.5,-.25,-.0024,8,-.25,-.0024],
// 3 14 -.121239 -.25 -.0024 4.219675 -.25 4.561125 4 -.25 4.7808
  [3,14,-.121239,-.25,-.0024,4.219675,-.25,4.561125,4,-.25,4.7808],
];
module ldraw_lib__s__6142622vs02(step=0, col=false, unit=2/5, alt=false, line=0.2, solid=!$preview)
    makepoly(ldraw_lib__s__6142622vs02(), step=step, col=col, unit=unit, alt=alt, line=line, solid=solid);
ldraw_lib__s__6142622vs02(line=0.2);
// file: s/6142622vs01.scad
use <../../lib.scad>
use <../../p/1-4chrd.scad>
function ldraw_lib__s__6142622vs01() = [
// 0 ~Sticker  2.9 x  0.8 with Black Trapezoid on Yellow Background Left - First Face
// 0 Name: s\6142622vs01.dat
// 0 Author: Massimo Maso [Sirio]
// 0 !LDRAW_ORG Subpart UPDATE 2022-03
// 0 !LICENSE Licensed under CC BY 2.0 and CC BY 4.0 : see CAreadme.txt
// 
// 0 BFC CERTIFY CCW
  [0,"BFC","CERTIFY"],
  [0,"BFC","CCW"],
// 
// 0 !HISTORY 2022-05-07 [PTadmin] Official Update 2022-03
// 
// 
// 0 // Primitives
// 1 14 -6.5 -.25 7.2773 0 0 -1.5 0 1 0 1.5 0 0 1-4chrd.dat
  [1,14,-6.5,-.25,7.2773,0,0,-1.5,0,1,0,1.5,0,0, ldraw_lib__1_4chrd()],
// 1 14 6.5 -.25 7.2773 0 0 1.5 0 1 0 1.5 0 0 1-4chrd.dat
  [1,14,6.5,-.25,7.2773,0,0,1.5,0,1,0,1.5,0,0, ldraw_lib__1_4chrd()],
// 0 // Yellow face
// 4 14 -8 -.25 7.2773 8 -.25 7.2773 6.5 -.25 8.7773 -6.5 -.25 8.7773
  [4,14,-8,-.25,7.2773,8,-.25,7.2773,6.5,-.25,8.7773,-6.5,-.25,8.7773],
// 4 14 -8 -.25 7.2773 -8 -.25 -.0021 8 -.25 -.0021 8 -.25 7.2773
  [4,14,-8,-.25,7.2773,-8,-.25,-.0021,8,-.25,-.0021,8,-.25,7.2773],
];
module ldraw_lib__s__6142622vs01(step=0, col=false, unit=2/5, alt=false, line=0.2, solid=!$preview)
    makepoly(ldraw_lib__s__6142622vs01(), step=step, col=col, unit=unit, alt=alt, line=line, solid=solid);
ldraw_lib__s__6142622vs01(line=0.2);
// main file
use <../lib.scad>
use <s/6142622vs01.scad>
use <s/6142622vs02.scad>
use <s/6142622vs03.scad>
use <s/6142622vs04.scad>
use <s/6142622vs05.scad>
use <s/6142622vs06.scad>
function ldraw_lib__6142622v() = [
// 0 Sticker  2.9 x  0.8 with Black Trapezoid on Yellow Background Left
// 0 Name: 6142622v.dat
// 0 Author: Massimo Maso [Sirio]
// 0 !LDRAW_ORG Part UPDATE 2022-03
// 0 !LICENSE Licensed under CC BY 2.0 and CC BY 4.0 : see CAreadme.txt
// 
// 0 !HELP Left is referred to the real vehicle
// 0 !HELP In Lego instruction this part is on the right of the vehicle
// 
// 0 BFC CERTIFY CCW
  [0,"BFC","CERTIFY"],
  [0,"BFC","CCW"],
// 
// 0 !KEYWORDS Chevrolet, Corvette, Set 75870, Speed Champions
// 
// 0 !HISTORY 2022-05-07 [PTadmin] Official Update 2022-03
// 
// 
// 1 16 0 0 20.1754 1 0 0 0 1 0 0 0 1 s\6142622vs01.dat
  [1,16,0,0,20.1754,1,0,0,0,1,0,0,0,1, ldraw_lib__s__6142622vs01()],
// 4 14 -8 -.25 20.1733 -8 -.25 9.392 8 -.25 9.392 8 -.25 20.1733
  [4,14,-8,-.25,20.1733,-8,-.25,9.392,8,-.25,9.392,8,-.25,20.1733],
// 1 16 0 0 -1.6871 1 0 0 0 1 0 0 0 1 s\6142622vs02.dat
  [1,16,0,0,-1.6871,1,0,0,0,1,0,0,0,1, ldraw_lib__s__6142622vs02()],
// 1 16 0 0 -1.6919 1 0 0 0 1 0 0 0 1 s\6142622vs03.dat
  [1,16,0,0,-1.6919,1,0,0,0,1,0,0,0,1, ldraw_lib__s__6142622vs03()],
// 1 16 0 0 -22.9507 1 0 0 0 1 0 0 0 1 s\6142622vs04.dat
  [1,16,0,0,-22.9507,1,0,0,0,1,0,0,0,1, ldraw_lib__s__6142622vs04()],
// 1 16 0 0 -22.9549 1 0 0 0 1 0 0 0 1 s\6142622vs05.dat
  [1,16,0,0,-22.9549,1,0,0,0,1,0,0,0,1, ldraw_lib__s__6142622vs05()],
// 1 16 0 0 -49.9063 1 0 0 0 1 0 0 0 1 s\6142622vs06.dat
  [1,16,0,0,-49.9063,1,0,0,0,1,0,0,0,1, ldraw_lib__s__6142622vs06()],
];
module ldraw_lib__6142622v(step=0, col=false, unit=2/5, alt=false, line=0.2, solid=!$preview)
    makepoly(ldraw_lib__6142622v(), step=step, col=col, unit=unit, alt=alt, line=line, solid=solid);
ldraw_lib__6142622v(line=0.2);
